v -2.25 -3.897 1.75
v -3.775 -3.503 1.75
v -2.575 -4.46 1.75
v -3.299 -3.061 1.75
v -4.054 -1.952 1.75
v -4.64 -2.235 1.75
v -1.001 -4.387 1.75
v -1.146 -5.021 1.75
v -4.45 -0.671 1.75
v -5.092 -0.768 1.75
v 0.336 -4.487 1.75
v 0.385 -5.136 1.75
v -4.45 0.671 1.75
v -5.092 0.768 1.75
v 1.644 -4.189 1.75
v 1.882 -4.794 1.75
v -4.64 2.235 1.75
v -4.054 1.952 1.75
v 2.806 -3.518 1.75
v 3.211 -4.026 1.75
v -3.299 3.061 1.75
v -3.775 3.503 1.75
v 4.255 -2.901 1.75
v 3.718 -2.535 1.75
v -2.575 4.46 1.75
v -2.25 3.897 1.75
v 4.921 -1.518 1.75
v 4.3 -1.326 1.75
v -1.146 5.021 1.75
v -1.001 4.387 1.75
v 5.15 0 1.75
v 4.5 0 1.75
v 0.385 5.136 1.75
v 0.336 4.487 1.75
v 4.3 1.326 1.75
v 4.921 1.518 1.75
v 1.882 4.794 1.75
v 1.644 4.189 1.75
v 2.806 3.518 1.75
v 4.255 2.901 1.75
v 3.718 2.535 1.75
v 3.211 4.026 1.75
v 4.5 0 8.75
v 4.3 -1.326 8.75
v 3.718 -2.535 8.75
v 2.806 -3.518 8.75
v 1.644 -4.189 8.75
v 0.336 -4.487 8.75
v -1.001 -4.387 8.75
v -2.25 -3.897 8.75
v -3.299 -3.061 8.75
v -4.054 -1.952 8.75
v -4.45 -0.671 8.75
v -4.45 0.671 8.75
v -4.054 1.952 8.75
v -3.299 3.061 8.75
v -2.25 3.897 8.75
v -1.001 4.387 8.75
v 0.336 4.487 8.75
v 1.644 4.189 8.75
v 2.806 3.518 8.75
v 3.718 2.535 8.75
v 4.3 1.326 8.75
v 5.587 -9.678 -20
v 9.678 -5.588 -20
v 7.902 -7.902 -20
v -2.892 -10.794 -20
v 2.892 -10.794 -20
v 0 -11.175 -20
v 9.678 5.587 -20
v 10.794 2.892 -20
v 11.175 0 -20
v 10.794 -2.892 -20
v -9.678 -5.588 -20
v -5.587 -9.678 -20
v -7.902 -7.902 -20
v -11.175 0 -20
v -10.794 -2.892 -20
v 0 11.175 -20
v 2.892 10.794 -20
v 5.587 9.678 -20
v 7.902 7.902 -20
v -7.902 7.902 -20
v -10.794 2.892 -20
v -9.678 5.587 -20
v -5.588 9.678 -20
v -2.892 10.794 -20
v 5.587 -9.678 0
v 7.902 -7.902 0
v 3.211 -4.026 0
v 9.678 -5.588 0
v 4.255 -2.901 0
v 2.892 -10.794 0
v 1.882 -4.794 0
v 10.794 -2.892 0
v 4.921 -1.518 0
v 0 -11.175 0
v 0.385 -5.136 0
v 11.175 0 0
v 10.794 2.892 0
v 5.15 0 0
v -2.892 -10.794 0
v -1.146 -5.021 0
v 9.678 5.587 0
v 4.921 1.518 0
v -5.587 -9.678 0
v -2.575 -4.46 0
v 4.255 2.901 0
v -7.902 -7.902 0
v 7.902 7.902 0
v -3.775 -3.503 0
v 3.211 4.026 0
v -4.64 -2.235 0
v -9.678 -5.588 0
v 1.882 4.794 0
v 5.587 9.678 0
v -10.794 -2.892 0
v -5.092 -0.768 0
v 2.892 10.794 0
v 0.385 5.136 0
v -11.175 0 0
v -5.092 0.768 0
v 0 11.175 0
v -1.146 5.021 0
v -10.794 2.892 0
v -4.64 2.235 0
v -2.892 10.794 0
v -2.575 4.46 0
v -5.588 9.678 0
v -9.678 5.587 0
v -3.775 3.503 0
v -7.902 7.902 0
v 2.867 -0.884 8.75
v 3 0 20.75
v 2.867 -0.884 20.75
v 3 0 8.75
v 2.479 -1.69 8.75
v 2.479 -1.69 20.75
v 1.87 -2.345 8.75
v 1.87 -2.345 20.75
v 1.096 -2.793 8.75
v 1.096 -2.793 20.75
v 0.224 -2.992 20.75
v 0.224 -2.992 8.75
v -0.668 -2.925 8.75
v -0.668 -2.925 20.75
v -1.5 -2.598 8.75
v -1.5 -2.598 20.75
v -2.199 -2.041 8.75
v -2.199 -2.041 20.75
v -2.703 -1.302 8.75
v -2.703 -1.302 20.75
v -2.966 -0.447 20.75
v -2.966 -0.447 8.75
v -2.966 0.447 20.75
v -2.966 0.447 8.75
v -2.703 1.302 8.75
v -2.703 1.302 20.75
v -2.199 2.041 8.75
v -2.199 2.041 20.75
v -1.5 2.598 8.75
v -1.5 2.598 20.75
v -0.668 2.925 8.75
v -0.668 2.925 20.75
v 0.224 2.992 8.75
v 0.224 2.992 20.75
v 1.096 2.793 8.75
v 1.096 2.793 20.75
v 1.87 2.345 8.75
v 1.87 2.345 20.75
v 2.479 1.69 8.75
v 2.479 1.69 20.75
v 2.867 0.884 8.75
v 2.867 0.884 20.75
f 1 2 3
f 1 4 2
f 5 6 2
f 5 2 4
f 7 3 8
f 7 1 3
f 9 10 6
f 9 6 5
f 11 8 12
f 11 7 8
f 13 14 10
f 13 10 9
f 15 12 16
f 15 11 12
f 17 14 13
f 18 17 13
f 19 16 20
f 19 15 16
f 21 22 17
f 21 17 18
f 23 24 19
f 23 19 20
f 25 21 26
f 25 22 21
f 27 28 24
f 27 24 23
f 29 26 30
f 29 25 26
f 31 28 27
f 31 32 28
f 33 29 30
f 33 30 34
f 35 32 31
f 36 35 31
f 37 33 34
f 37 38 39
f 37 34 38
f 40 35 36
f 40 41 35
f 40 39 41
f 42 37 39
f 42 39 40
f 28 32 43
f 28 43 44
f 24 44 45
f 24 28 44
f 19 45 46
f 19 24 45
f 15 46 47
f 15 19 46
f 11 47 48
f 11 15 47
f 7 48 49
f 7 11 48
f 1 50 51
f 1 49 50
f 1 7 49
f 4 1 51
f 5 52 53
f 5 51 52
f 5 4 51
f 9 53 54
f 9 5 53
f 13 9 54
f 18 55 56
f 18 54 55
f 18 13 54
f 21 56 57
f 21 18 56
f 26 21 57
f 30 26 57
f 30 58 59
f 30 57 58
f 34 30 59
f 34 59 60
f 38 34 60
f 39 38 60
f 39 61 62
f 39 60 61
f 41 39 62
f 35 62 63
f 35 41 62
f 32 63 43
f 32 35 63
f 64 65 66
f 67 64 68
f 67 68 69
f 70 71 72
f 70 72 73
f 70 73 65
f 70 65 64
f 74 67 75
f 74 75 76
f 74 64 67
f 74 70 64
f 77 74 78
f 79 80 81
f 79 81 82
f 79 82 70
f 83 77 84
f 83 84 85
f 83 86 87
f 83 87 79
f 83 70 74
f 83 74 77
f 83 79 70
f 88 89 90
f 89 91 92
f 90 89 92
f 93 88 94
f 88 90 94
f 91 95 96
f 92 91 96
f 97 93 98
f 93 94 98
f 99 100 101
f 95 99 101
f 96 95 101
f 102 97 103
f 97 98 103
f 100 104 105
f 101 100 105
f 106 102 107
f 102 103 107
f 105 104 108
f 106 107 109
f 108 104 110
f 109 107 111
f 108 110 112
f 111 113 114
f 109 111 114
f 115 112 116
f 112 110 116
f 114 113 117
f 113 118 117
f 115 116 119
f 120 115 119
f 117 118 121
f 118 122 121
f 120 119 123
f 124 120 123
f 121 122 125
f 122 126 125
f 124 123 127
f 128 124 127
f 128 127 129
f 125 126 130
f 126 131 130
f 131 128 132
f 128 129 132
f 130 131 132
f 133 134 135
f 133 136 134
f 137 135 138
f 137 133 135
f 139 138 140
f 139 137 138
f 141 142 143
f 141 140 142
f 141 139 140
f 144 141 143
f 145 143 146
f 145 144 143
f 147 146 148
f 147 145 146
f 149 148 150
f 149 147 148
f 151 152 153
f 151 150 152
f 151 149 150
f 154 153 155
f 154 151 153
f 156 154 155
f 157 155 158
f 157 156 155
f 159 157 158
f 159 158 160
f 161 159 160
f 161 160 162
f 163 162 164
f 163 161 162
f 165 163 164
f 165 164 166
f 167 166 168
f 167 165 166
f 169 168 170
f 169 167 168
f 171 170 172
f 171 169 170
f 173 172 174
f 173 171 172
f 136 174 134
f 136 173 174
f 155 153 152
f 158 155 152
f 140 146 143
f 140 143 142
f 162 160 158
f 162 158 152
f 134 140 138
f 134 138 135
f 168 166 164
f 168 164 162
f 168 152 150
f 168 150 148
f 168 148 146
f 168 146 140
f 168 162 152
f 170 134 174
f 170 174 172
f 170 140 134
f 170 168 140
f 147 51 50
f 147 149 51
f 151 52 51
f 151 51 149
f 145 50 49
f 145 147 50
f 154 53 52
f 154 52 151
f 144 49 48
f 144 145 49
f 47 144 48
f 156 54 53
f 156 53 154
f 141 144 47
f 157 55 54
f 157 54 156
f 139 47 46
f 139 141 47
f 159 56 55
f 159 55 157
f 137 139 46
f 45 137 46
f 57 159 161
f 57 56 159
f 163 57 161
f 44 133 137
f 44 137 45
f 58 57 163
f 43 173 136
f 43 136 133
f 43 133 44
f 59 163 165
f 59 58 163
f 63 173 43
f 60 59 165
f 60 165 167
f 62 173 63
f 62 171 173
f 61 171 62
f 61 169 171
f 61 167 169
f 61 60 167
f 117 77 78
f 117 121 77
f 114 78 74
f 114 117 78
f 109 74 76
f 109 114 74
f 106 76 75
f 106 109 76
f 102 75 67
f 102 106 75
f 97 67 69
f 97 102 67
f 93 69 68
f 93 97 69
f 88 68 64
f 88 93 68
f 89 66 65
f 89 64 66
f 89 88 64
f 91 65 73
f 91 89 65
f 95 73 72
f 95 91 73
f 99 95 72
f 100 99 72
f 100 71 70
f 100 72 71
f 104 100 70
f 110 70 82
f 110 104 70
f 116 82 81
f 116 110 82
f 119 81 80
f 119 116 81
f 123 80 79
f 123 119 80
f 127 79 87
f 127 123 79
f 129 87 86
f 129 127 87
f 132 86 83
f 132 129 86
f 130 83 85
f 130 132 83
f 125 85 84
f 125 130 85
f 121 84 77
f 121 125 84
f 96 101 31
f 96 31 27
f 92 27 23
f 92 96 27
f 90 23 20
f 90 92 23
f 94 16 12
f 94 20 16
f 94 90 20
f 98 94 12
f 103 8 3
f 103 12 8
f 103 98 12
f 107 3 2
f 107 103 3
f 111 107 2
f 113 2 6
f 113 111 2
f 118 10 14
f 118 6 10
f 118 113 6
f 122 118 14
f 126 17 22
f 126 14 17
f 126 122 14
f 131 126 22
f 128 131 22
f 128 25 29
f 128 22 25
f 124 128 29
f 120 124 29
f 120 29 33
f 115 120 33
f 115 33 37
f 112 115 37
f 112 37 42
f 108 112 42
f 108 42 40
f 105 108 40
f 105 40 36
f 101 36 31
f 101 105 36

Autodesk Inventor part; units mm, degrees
ref_plane "YZ Plane" through (0, 0, 0) normal (1, 0, 0) x (0, 1, 0)
ref_plane "XZ Plane" through (0, 0, 0) normal (0, 1, 0) x (-1, 0, 0)
ref_plane "XY Plane" through (0, 0, 0) normal (0, 0, 1) x (1, 0, 0)
sketch "スケッチ1" plane through (0, 0, 0) normal (0, 0, 1) x (1, 0, 0)
  circle A0 centre (0, 0) radius 5.15
  dimension "d0" = 10.3
extrude "押し出し1" add sketch "スケッチ1" along normal blind 1.75
sketch "スケッチ2" plane through (0, 0, 1.75) normal (0, 0, 1) x (1, 0, 0)
  circle A0 centre (0, 0) radius 4.5
  dimension "d3" = 9
extrude "押し出し2" add sketch "スケッチ2" along normal blind 7
thread "ねじ1" size "M9x1.25" class "6g" standard "ANSI Metric M Profile" full length
sketch "スケッチ3" plane through (0, 0, 8.75) normal (0, 0, 1) x (1, 0, 0)
  circle A0 centre (0, 0) radius 3
  dimension "d8" = 6
extrude "押し出し3" add sketch "スケッチ3" along normal blind 12
sketch "スケッチ4" plane through (0, 0, 0) normal (0, 0, -1) x (-1, 0, 0)
  circle A0 centre (0, 0) radius 11.175
  dimension "d11" = 22.35
extrude "押し出し4" add sketch "スケッチ4" along normal blind 20
properties part number "ポテンショメータB"
